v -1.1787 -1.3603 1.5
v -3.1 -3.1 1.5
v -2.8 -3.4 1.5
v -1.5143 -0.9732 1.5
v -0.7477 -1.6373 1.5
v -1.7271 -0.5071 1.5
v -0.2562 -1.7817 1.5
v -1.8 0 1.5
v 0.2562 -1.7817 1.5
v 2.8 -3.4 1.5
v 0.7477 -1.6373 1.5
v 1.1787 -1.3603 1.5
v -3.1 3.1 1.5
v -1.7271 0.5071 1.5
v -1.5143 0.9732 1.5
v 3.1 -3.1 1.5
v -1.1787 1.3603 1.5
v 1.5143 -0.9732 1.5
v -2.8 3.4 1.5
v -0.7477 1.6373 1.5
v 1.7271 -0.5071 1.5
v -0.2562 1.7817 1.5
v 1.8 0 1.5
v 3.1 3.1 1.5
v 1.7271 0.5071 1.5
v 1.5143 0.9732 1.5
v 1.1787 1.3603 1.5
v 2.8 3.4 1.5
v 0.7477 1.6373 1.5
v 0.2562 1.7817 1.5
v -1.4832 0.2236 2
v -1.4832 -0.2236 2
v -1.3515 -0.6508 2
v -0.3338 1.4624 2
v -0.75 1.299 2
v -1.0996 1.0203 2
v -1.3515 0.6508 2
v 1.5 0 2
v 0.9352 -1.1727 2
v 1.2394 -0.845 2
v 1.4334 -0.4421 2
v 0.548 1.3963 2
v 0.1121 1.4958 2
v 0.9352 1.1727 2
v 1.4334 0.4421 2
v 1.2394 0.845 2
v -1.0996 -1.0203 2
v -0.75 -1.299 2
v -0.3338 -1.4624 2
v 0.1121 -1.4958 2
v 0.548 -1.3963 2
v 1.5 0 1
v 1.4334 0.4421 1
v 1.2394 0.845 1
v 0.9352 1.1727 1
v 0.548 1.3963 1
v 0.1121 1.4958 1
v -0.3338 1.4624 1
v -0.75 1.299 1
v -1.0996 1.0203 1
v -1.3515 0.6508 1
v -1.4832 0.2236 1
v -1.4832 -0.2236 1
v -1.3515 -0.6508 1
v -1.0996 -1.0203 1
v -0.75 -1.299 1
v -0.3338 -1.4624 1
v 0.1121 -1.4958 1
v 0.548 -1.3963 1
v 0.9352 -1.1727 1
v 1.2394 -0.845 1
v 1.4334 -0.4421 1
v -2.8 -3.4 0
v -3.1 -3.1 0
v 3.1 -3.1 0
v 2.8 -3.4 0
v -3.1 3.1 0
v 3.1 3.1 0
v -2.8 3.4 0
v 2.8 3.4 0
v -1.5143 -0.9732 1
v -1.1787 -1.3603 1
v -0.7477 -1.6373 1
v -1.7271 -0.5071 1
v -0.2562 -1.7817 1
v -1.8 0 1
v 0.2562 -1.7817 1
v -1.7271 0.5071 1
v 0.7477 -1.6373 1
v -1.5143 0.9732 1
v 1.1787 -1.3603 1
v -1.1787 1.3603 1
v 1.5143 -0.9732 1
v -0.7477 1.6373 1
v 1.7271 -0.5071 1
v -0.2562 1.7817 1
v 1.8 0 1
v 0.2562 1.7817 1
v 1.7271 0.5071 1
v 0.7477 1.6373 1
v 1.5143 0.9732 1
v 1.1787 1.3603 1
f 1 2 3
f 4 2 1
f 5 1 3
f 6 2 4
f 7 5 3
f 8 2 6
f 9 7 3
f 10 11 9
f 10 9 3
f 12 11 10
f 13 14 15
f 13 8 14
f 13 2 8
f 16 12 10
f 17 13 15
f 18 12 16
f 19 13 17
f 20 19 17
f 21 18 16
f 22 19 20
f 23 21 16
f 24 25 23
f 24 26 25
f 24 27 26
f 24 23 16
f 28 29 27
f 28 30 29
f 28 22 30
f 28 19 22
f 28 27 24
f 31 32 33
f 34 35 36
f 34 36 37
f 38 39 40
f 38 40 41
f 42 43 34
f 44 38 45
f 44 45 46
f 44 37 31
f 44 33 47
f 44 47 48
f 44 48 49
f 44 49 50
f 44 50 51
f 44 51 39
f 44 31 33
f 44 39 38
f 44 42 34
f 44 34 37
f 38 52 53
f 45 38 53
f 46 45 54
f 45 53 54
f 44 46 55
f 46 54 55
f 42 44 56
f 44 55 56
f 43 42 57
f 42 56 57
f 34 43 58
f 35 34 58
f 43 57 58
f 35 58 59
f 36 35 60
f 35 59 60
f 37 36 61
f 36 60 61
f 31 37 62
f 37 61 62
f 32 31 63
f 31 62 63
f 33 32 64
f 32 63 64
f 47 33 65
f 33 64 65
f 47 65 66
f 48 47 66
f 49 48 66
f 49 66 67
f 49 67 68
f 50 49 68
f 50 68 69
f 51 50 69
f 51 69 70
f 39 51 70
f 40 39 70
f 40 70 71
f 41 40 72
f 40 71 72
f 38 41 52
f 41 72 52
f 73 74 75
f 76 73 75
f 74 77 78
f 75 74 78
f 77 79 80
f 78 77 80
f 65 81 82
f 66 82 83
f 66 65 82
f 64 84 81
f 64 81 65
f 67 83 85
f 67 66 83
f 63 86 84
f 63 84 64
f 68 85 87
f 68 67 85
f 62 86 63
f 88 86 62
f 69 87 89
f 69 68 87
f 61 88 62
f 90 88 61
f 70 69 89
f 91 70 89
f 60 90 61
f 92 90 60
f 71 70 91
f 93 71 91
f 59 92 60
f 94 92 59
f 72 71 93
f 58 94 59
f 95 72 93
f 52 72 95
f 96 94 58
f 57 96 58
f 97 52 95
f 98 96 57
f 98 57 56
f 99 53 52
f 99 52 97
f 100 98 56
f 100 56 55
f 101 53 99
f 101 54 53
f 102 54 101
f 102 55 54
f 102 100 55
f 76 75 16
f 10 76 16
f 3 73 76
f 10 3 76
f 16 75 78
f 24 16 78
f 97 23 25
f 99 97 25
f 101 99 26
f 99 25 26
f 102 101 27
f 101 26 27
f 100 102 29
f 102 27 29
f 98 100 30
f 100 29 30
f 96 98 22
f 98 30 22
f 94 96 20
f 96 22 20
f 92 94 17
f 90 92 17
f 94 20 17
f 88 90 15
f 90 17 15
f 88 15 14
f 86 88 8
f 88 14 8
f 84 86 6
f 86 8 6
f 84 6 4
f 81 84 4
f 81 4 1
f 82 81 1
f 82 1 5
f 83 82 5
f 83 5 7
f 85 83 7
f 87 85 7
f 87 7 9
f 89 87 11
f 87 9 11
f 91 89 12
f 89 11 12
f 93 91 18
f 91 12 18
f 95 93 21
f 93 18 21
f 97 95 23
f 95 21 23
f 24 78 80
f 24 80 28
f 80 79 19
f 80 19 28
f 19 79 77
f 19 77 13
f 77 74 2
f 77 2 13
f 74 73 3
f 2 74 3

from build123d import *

# Parameters (mm, degrees)
F0_W     = 6.2
F0_H     = 6.8
F1_DEPTH = 1.5
F2_R     = 1.8
F3_DEPTH = 0.5
F4_R     = 1.5
F5_DEPTH = 1
F6_SIZE  = 0.3


with BuildPart() as f1:
    # F0 (on Top) → F1 (new body)
    with BuildSketch(Plane.XY):
        Rectangle(F0_W, F0_H)
    extrude(amount=F1_DEPTH)

    # F2 (on face) → F3 (cut)
    with BuildSketch(Plane.XY.offset(1.5)):
        Circle(F2_R)
    extrude(amount=-F3_DEPTH, mode=Mode.SUBTRACT)

    # F4 (on face) → F5 (join)
    with BuildSketch(Plane.XY.offset(1)):
        Circle(F4_R)
    extrude(amount=F5_DEPTH)

    # F6
    f6_edges = [f1.edges().sort_by_distance(p)[0] for p in [
        (-3.1, -3.4, 0.75),
        (3.1, -3.4, 0.75),
        (3.1, 3.4, 0.75),
        (-3.1, 3.4, 0.75),
    ]]
    chamfer(f6_edges, length=F6_SIZE)


solid = f1.part
